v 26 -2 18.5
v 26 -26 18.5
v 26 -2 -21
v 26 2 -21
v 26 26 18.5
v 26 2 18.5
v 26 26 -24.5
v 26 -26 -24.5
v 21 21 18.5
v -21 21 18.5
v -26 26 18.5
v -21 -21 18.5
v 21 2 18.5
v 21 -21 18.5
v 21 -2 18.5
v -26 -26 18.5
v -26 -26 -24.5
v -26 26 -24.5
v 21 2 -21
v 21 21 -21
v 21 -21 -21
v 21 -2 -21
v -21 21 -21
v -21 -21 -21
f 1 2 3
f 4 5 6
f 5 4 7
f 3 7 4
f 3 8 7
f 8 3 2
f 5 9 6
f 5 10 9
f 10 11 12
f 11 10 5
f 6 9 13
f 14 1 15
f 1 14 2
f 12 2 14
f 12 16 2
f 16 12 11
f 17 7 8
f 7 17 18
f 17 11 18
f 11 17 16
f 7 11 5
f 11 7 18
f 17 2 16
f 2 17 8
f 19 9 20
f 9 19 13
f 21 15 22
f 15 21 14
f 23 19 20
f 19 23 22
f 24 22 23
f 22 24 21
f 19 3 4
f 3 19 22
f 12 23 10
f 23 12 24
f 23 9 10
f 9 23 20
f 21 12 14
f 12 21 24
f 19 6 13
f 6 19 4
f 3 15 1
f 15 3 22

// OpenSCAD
wall_thickness = 10;
motor_height	= 42;
connector_width = motor_height;
connector_height	= 4;


module motor(){
	cube([42,42,motor_height], center=true);
}
module basic(){
	cube([42+wall_thickness,42+wall_thickness,40+3], center=true);
}

difference(){
	translate([0,0,-3]) basic();
	motor();
	translate([motor_height/2,0,(-motor_height/2)+connector_width/2]) cube([20,connector_height,connector_width], center=true);
}
